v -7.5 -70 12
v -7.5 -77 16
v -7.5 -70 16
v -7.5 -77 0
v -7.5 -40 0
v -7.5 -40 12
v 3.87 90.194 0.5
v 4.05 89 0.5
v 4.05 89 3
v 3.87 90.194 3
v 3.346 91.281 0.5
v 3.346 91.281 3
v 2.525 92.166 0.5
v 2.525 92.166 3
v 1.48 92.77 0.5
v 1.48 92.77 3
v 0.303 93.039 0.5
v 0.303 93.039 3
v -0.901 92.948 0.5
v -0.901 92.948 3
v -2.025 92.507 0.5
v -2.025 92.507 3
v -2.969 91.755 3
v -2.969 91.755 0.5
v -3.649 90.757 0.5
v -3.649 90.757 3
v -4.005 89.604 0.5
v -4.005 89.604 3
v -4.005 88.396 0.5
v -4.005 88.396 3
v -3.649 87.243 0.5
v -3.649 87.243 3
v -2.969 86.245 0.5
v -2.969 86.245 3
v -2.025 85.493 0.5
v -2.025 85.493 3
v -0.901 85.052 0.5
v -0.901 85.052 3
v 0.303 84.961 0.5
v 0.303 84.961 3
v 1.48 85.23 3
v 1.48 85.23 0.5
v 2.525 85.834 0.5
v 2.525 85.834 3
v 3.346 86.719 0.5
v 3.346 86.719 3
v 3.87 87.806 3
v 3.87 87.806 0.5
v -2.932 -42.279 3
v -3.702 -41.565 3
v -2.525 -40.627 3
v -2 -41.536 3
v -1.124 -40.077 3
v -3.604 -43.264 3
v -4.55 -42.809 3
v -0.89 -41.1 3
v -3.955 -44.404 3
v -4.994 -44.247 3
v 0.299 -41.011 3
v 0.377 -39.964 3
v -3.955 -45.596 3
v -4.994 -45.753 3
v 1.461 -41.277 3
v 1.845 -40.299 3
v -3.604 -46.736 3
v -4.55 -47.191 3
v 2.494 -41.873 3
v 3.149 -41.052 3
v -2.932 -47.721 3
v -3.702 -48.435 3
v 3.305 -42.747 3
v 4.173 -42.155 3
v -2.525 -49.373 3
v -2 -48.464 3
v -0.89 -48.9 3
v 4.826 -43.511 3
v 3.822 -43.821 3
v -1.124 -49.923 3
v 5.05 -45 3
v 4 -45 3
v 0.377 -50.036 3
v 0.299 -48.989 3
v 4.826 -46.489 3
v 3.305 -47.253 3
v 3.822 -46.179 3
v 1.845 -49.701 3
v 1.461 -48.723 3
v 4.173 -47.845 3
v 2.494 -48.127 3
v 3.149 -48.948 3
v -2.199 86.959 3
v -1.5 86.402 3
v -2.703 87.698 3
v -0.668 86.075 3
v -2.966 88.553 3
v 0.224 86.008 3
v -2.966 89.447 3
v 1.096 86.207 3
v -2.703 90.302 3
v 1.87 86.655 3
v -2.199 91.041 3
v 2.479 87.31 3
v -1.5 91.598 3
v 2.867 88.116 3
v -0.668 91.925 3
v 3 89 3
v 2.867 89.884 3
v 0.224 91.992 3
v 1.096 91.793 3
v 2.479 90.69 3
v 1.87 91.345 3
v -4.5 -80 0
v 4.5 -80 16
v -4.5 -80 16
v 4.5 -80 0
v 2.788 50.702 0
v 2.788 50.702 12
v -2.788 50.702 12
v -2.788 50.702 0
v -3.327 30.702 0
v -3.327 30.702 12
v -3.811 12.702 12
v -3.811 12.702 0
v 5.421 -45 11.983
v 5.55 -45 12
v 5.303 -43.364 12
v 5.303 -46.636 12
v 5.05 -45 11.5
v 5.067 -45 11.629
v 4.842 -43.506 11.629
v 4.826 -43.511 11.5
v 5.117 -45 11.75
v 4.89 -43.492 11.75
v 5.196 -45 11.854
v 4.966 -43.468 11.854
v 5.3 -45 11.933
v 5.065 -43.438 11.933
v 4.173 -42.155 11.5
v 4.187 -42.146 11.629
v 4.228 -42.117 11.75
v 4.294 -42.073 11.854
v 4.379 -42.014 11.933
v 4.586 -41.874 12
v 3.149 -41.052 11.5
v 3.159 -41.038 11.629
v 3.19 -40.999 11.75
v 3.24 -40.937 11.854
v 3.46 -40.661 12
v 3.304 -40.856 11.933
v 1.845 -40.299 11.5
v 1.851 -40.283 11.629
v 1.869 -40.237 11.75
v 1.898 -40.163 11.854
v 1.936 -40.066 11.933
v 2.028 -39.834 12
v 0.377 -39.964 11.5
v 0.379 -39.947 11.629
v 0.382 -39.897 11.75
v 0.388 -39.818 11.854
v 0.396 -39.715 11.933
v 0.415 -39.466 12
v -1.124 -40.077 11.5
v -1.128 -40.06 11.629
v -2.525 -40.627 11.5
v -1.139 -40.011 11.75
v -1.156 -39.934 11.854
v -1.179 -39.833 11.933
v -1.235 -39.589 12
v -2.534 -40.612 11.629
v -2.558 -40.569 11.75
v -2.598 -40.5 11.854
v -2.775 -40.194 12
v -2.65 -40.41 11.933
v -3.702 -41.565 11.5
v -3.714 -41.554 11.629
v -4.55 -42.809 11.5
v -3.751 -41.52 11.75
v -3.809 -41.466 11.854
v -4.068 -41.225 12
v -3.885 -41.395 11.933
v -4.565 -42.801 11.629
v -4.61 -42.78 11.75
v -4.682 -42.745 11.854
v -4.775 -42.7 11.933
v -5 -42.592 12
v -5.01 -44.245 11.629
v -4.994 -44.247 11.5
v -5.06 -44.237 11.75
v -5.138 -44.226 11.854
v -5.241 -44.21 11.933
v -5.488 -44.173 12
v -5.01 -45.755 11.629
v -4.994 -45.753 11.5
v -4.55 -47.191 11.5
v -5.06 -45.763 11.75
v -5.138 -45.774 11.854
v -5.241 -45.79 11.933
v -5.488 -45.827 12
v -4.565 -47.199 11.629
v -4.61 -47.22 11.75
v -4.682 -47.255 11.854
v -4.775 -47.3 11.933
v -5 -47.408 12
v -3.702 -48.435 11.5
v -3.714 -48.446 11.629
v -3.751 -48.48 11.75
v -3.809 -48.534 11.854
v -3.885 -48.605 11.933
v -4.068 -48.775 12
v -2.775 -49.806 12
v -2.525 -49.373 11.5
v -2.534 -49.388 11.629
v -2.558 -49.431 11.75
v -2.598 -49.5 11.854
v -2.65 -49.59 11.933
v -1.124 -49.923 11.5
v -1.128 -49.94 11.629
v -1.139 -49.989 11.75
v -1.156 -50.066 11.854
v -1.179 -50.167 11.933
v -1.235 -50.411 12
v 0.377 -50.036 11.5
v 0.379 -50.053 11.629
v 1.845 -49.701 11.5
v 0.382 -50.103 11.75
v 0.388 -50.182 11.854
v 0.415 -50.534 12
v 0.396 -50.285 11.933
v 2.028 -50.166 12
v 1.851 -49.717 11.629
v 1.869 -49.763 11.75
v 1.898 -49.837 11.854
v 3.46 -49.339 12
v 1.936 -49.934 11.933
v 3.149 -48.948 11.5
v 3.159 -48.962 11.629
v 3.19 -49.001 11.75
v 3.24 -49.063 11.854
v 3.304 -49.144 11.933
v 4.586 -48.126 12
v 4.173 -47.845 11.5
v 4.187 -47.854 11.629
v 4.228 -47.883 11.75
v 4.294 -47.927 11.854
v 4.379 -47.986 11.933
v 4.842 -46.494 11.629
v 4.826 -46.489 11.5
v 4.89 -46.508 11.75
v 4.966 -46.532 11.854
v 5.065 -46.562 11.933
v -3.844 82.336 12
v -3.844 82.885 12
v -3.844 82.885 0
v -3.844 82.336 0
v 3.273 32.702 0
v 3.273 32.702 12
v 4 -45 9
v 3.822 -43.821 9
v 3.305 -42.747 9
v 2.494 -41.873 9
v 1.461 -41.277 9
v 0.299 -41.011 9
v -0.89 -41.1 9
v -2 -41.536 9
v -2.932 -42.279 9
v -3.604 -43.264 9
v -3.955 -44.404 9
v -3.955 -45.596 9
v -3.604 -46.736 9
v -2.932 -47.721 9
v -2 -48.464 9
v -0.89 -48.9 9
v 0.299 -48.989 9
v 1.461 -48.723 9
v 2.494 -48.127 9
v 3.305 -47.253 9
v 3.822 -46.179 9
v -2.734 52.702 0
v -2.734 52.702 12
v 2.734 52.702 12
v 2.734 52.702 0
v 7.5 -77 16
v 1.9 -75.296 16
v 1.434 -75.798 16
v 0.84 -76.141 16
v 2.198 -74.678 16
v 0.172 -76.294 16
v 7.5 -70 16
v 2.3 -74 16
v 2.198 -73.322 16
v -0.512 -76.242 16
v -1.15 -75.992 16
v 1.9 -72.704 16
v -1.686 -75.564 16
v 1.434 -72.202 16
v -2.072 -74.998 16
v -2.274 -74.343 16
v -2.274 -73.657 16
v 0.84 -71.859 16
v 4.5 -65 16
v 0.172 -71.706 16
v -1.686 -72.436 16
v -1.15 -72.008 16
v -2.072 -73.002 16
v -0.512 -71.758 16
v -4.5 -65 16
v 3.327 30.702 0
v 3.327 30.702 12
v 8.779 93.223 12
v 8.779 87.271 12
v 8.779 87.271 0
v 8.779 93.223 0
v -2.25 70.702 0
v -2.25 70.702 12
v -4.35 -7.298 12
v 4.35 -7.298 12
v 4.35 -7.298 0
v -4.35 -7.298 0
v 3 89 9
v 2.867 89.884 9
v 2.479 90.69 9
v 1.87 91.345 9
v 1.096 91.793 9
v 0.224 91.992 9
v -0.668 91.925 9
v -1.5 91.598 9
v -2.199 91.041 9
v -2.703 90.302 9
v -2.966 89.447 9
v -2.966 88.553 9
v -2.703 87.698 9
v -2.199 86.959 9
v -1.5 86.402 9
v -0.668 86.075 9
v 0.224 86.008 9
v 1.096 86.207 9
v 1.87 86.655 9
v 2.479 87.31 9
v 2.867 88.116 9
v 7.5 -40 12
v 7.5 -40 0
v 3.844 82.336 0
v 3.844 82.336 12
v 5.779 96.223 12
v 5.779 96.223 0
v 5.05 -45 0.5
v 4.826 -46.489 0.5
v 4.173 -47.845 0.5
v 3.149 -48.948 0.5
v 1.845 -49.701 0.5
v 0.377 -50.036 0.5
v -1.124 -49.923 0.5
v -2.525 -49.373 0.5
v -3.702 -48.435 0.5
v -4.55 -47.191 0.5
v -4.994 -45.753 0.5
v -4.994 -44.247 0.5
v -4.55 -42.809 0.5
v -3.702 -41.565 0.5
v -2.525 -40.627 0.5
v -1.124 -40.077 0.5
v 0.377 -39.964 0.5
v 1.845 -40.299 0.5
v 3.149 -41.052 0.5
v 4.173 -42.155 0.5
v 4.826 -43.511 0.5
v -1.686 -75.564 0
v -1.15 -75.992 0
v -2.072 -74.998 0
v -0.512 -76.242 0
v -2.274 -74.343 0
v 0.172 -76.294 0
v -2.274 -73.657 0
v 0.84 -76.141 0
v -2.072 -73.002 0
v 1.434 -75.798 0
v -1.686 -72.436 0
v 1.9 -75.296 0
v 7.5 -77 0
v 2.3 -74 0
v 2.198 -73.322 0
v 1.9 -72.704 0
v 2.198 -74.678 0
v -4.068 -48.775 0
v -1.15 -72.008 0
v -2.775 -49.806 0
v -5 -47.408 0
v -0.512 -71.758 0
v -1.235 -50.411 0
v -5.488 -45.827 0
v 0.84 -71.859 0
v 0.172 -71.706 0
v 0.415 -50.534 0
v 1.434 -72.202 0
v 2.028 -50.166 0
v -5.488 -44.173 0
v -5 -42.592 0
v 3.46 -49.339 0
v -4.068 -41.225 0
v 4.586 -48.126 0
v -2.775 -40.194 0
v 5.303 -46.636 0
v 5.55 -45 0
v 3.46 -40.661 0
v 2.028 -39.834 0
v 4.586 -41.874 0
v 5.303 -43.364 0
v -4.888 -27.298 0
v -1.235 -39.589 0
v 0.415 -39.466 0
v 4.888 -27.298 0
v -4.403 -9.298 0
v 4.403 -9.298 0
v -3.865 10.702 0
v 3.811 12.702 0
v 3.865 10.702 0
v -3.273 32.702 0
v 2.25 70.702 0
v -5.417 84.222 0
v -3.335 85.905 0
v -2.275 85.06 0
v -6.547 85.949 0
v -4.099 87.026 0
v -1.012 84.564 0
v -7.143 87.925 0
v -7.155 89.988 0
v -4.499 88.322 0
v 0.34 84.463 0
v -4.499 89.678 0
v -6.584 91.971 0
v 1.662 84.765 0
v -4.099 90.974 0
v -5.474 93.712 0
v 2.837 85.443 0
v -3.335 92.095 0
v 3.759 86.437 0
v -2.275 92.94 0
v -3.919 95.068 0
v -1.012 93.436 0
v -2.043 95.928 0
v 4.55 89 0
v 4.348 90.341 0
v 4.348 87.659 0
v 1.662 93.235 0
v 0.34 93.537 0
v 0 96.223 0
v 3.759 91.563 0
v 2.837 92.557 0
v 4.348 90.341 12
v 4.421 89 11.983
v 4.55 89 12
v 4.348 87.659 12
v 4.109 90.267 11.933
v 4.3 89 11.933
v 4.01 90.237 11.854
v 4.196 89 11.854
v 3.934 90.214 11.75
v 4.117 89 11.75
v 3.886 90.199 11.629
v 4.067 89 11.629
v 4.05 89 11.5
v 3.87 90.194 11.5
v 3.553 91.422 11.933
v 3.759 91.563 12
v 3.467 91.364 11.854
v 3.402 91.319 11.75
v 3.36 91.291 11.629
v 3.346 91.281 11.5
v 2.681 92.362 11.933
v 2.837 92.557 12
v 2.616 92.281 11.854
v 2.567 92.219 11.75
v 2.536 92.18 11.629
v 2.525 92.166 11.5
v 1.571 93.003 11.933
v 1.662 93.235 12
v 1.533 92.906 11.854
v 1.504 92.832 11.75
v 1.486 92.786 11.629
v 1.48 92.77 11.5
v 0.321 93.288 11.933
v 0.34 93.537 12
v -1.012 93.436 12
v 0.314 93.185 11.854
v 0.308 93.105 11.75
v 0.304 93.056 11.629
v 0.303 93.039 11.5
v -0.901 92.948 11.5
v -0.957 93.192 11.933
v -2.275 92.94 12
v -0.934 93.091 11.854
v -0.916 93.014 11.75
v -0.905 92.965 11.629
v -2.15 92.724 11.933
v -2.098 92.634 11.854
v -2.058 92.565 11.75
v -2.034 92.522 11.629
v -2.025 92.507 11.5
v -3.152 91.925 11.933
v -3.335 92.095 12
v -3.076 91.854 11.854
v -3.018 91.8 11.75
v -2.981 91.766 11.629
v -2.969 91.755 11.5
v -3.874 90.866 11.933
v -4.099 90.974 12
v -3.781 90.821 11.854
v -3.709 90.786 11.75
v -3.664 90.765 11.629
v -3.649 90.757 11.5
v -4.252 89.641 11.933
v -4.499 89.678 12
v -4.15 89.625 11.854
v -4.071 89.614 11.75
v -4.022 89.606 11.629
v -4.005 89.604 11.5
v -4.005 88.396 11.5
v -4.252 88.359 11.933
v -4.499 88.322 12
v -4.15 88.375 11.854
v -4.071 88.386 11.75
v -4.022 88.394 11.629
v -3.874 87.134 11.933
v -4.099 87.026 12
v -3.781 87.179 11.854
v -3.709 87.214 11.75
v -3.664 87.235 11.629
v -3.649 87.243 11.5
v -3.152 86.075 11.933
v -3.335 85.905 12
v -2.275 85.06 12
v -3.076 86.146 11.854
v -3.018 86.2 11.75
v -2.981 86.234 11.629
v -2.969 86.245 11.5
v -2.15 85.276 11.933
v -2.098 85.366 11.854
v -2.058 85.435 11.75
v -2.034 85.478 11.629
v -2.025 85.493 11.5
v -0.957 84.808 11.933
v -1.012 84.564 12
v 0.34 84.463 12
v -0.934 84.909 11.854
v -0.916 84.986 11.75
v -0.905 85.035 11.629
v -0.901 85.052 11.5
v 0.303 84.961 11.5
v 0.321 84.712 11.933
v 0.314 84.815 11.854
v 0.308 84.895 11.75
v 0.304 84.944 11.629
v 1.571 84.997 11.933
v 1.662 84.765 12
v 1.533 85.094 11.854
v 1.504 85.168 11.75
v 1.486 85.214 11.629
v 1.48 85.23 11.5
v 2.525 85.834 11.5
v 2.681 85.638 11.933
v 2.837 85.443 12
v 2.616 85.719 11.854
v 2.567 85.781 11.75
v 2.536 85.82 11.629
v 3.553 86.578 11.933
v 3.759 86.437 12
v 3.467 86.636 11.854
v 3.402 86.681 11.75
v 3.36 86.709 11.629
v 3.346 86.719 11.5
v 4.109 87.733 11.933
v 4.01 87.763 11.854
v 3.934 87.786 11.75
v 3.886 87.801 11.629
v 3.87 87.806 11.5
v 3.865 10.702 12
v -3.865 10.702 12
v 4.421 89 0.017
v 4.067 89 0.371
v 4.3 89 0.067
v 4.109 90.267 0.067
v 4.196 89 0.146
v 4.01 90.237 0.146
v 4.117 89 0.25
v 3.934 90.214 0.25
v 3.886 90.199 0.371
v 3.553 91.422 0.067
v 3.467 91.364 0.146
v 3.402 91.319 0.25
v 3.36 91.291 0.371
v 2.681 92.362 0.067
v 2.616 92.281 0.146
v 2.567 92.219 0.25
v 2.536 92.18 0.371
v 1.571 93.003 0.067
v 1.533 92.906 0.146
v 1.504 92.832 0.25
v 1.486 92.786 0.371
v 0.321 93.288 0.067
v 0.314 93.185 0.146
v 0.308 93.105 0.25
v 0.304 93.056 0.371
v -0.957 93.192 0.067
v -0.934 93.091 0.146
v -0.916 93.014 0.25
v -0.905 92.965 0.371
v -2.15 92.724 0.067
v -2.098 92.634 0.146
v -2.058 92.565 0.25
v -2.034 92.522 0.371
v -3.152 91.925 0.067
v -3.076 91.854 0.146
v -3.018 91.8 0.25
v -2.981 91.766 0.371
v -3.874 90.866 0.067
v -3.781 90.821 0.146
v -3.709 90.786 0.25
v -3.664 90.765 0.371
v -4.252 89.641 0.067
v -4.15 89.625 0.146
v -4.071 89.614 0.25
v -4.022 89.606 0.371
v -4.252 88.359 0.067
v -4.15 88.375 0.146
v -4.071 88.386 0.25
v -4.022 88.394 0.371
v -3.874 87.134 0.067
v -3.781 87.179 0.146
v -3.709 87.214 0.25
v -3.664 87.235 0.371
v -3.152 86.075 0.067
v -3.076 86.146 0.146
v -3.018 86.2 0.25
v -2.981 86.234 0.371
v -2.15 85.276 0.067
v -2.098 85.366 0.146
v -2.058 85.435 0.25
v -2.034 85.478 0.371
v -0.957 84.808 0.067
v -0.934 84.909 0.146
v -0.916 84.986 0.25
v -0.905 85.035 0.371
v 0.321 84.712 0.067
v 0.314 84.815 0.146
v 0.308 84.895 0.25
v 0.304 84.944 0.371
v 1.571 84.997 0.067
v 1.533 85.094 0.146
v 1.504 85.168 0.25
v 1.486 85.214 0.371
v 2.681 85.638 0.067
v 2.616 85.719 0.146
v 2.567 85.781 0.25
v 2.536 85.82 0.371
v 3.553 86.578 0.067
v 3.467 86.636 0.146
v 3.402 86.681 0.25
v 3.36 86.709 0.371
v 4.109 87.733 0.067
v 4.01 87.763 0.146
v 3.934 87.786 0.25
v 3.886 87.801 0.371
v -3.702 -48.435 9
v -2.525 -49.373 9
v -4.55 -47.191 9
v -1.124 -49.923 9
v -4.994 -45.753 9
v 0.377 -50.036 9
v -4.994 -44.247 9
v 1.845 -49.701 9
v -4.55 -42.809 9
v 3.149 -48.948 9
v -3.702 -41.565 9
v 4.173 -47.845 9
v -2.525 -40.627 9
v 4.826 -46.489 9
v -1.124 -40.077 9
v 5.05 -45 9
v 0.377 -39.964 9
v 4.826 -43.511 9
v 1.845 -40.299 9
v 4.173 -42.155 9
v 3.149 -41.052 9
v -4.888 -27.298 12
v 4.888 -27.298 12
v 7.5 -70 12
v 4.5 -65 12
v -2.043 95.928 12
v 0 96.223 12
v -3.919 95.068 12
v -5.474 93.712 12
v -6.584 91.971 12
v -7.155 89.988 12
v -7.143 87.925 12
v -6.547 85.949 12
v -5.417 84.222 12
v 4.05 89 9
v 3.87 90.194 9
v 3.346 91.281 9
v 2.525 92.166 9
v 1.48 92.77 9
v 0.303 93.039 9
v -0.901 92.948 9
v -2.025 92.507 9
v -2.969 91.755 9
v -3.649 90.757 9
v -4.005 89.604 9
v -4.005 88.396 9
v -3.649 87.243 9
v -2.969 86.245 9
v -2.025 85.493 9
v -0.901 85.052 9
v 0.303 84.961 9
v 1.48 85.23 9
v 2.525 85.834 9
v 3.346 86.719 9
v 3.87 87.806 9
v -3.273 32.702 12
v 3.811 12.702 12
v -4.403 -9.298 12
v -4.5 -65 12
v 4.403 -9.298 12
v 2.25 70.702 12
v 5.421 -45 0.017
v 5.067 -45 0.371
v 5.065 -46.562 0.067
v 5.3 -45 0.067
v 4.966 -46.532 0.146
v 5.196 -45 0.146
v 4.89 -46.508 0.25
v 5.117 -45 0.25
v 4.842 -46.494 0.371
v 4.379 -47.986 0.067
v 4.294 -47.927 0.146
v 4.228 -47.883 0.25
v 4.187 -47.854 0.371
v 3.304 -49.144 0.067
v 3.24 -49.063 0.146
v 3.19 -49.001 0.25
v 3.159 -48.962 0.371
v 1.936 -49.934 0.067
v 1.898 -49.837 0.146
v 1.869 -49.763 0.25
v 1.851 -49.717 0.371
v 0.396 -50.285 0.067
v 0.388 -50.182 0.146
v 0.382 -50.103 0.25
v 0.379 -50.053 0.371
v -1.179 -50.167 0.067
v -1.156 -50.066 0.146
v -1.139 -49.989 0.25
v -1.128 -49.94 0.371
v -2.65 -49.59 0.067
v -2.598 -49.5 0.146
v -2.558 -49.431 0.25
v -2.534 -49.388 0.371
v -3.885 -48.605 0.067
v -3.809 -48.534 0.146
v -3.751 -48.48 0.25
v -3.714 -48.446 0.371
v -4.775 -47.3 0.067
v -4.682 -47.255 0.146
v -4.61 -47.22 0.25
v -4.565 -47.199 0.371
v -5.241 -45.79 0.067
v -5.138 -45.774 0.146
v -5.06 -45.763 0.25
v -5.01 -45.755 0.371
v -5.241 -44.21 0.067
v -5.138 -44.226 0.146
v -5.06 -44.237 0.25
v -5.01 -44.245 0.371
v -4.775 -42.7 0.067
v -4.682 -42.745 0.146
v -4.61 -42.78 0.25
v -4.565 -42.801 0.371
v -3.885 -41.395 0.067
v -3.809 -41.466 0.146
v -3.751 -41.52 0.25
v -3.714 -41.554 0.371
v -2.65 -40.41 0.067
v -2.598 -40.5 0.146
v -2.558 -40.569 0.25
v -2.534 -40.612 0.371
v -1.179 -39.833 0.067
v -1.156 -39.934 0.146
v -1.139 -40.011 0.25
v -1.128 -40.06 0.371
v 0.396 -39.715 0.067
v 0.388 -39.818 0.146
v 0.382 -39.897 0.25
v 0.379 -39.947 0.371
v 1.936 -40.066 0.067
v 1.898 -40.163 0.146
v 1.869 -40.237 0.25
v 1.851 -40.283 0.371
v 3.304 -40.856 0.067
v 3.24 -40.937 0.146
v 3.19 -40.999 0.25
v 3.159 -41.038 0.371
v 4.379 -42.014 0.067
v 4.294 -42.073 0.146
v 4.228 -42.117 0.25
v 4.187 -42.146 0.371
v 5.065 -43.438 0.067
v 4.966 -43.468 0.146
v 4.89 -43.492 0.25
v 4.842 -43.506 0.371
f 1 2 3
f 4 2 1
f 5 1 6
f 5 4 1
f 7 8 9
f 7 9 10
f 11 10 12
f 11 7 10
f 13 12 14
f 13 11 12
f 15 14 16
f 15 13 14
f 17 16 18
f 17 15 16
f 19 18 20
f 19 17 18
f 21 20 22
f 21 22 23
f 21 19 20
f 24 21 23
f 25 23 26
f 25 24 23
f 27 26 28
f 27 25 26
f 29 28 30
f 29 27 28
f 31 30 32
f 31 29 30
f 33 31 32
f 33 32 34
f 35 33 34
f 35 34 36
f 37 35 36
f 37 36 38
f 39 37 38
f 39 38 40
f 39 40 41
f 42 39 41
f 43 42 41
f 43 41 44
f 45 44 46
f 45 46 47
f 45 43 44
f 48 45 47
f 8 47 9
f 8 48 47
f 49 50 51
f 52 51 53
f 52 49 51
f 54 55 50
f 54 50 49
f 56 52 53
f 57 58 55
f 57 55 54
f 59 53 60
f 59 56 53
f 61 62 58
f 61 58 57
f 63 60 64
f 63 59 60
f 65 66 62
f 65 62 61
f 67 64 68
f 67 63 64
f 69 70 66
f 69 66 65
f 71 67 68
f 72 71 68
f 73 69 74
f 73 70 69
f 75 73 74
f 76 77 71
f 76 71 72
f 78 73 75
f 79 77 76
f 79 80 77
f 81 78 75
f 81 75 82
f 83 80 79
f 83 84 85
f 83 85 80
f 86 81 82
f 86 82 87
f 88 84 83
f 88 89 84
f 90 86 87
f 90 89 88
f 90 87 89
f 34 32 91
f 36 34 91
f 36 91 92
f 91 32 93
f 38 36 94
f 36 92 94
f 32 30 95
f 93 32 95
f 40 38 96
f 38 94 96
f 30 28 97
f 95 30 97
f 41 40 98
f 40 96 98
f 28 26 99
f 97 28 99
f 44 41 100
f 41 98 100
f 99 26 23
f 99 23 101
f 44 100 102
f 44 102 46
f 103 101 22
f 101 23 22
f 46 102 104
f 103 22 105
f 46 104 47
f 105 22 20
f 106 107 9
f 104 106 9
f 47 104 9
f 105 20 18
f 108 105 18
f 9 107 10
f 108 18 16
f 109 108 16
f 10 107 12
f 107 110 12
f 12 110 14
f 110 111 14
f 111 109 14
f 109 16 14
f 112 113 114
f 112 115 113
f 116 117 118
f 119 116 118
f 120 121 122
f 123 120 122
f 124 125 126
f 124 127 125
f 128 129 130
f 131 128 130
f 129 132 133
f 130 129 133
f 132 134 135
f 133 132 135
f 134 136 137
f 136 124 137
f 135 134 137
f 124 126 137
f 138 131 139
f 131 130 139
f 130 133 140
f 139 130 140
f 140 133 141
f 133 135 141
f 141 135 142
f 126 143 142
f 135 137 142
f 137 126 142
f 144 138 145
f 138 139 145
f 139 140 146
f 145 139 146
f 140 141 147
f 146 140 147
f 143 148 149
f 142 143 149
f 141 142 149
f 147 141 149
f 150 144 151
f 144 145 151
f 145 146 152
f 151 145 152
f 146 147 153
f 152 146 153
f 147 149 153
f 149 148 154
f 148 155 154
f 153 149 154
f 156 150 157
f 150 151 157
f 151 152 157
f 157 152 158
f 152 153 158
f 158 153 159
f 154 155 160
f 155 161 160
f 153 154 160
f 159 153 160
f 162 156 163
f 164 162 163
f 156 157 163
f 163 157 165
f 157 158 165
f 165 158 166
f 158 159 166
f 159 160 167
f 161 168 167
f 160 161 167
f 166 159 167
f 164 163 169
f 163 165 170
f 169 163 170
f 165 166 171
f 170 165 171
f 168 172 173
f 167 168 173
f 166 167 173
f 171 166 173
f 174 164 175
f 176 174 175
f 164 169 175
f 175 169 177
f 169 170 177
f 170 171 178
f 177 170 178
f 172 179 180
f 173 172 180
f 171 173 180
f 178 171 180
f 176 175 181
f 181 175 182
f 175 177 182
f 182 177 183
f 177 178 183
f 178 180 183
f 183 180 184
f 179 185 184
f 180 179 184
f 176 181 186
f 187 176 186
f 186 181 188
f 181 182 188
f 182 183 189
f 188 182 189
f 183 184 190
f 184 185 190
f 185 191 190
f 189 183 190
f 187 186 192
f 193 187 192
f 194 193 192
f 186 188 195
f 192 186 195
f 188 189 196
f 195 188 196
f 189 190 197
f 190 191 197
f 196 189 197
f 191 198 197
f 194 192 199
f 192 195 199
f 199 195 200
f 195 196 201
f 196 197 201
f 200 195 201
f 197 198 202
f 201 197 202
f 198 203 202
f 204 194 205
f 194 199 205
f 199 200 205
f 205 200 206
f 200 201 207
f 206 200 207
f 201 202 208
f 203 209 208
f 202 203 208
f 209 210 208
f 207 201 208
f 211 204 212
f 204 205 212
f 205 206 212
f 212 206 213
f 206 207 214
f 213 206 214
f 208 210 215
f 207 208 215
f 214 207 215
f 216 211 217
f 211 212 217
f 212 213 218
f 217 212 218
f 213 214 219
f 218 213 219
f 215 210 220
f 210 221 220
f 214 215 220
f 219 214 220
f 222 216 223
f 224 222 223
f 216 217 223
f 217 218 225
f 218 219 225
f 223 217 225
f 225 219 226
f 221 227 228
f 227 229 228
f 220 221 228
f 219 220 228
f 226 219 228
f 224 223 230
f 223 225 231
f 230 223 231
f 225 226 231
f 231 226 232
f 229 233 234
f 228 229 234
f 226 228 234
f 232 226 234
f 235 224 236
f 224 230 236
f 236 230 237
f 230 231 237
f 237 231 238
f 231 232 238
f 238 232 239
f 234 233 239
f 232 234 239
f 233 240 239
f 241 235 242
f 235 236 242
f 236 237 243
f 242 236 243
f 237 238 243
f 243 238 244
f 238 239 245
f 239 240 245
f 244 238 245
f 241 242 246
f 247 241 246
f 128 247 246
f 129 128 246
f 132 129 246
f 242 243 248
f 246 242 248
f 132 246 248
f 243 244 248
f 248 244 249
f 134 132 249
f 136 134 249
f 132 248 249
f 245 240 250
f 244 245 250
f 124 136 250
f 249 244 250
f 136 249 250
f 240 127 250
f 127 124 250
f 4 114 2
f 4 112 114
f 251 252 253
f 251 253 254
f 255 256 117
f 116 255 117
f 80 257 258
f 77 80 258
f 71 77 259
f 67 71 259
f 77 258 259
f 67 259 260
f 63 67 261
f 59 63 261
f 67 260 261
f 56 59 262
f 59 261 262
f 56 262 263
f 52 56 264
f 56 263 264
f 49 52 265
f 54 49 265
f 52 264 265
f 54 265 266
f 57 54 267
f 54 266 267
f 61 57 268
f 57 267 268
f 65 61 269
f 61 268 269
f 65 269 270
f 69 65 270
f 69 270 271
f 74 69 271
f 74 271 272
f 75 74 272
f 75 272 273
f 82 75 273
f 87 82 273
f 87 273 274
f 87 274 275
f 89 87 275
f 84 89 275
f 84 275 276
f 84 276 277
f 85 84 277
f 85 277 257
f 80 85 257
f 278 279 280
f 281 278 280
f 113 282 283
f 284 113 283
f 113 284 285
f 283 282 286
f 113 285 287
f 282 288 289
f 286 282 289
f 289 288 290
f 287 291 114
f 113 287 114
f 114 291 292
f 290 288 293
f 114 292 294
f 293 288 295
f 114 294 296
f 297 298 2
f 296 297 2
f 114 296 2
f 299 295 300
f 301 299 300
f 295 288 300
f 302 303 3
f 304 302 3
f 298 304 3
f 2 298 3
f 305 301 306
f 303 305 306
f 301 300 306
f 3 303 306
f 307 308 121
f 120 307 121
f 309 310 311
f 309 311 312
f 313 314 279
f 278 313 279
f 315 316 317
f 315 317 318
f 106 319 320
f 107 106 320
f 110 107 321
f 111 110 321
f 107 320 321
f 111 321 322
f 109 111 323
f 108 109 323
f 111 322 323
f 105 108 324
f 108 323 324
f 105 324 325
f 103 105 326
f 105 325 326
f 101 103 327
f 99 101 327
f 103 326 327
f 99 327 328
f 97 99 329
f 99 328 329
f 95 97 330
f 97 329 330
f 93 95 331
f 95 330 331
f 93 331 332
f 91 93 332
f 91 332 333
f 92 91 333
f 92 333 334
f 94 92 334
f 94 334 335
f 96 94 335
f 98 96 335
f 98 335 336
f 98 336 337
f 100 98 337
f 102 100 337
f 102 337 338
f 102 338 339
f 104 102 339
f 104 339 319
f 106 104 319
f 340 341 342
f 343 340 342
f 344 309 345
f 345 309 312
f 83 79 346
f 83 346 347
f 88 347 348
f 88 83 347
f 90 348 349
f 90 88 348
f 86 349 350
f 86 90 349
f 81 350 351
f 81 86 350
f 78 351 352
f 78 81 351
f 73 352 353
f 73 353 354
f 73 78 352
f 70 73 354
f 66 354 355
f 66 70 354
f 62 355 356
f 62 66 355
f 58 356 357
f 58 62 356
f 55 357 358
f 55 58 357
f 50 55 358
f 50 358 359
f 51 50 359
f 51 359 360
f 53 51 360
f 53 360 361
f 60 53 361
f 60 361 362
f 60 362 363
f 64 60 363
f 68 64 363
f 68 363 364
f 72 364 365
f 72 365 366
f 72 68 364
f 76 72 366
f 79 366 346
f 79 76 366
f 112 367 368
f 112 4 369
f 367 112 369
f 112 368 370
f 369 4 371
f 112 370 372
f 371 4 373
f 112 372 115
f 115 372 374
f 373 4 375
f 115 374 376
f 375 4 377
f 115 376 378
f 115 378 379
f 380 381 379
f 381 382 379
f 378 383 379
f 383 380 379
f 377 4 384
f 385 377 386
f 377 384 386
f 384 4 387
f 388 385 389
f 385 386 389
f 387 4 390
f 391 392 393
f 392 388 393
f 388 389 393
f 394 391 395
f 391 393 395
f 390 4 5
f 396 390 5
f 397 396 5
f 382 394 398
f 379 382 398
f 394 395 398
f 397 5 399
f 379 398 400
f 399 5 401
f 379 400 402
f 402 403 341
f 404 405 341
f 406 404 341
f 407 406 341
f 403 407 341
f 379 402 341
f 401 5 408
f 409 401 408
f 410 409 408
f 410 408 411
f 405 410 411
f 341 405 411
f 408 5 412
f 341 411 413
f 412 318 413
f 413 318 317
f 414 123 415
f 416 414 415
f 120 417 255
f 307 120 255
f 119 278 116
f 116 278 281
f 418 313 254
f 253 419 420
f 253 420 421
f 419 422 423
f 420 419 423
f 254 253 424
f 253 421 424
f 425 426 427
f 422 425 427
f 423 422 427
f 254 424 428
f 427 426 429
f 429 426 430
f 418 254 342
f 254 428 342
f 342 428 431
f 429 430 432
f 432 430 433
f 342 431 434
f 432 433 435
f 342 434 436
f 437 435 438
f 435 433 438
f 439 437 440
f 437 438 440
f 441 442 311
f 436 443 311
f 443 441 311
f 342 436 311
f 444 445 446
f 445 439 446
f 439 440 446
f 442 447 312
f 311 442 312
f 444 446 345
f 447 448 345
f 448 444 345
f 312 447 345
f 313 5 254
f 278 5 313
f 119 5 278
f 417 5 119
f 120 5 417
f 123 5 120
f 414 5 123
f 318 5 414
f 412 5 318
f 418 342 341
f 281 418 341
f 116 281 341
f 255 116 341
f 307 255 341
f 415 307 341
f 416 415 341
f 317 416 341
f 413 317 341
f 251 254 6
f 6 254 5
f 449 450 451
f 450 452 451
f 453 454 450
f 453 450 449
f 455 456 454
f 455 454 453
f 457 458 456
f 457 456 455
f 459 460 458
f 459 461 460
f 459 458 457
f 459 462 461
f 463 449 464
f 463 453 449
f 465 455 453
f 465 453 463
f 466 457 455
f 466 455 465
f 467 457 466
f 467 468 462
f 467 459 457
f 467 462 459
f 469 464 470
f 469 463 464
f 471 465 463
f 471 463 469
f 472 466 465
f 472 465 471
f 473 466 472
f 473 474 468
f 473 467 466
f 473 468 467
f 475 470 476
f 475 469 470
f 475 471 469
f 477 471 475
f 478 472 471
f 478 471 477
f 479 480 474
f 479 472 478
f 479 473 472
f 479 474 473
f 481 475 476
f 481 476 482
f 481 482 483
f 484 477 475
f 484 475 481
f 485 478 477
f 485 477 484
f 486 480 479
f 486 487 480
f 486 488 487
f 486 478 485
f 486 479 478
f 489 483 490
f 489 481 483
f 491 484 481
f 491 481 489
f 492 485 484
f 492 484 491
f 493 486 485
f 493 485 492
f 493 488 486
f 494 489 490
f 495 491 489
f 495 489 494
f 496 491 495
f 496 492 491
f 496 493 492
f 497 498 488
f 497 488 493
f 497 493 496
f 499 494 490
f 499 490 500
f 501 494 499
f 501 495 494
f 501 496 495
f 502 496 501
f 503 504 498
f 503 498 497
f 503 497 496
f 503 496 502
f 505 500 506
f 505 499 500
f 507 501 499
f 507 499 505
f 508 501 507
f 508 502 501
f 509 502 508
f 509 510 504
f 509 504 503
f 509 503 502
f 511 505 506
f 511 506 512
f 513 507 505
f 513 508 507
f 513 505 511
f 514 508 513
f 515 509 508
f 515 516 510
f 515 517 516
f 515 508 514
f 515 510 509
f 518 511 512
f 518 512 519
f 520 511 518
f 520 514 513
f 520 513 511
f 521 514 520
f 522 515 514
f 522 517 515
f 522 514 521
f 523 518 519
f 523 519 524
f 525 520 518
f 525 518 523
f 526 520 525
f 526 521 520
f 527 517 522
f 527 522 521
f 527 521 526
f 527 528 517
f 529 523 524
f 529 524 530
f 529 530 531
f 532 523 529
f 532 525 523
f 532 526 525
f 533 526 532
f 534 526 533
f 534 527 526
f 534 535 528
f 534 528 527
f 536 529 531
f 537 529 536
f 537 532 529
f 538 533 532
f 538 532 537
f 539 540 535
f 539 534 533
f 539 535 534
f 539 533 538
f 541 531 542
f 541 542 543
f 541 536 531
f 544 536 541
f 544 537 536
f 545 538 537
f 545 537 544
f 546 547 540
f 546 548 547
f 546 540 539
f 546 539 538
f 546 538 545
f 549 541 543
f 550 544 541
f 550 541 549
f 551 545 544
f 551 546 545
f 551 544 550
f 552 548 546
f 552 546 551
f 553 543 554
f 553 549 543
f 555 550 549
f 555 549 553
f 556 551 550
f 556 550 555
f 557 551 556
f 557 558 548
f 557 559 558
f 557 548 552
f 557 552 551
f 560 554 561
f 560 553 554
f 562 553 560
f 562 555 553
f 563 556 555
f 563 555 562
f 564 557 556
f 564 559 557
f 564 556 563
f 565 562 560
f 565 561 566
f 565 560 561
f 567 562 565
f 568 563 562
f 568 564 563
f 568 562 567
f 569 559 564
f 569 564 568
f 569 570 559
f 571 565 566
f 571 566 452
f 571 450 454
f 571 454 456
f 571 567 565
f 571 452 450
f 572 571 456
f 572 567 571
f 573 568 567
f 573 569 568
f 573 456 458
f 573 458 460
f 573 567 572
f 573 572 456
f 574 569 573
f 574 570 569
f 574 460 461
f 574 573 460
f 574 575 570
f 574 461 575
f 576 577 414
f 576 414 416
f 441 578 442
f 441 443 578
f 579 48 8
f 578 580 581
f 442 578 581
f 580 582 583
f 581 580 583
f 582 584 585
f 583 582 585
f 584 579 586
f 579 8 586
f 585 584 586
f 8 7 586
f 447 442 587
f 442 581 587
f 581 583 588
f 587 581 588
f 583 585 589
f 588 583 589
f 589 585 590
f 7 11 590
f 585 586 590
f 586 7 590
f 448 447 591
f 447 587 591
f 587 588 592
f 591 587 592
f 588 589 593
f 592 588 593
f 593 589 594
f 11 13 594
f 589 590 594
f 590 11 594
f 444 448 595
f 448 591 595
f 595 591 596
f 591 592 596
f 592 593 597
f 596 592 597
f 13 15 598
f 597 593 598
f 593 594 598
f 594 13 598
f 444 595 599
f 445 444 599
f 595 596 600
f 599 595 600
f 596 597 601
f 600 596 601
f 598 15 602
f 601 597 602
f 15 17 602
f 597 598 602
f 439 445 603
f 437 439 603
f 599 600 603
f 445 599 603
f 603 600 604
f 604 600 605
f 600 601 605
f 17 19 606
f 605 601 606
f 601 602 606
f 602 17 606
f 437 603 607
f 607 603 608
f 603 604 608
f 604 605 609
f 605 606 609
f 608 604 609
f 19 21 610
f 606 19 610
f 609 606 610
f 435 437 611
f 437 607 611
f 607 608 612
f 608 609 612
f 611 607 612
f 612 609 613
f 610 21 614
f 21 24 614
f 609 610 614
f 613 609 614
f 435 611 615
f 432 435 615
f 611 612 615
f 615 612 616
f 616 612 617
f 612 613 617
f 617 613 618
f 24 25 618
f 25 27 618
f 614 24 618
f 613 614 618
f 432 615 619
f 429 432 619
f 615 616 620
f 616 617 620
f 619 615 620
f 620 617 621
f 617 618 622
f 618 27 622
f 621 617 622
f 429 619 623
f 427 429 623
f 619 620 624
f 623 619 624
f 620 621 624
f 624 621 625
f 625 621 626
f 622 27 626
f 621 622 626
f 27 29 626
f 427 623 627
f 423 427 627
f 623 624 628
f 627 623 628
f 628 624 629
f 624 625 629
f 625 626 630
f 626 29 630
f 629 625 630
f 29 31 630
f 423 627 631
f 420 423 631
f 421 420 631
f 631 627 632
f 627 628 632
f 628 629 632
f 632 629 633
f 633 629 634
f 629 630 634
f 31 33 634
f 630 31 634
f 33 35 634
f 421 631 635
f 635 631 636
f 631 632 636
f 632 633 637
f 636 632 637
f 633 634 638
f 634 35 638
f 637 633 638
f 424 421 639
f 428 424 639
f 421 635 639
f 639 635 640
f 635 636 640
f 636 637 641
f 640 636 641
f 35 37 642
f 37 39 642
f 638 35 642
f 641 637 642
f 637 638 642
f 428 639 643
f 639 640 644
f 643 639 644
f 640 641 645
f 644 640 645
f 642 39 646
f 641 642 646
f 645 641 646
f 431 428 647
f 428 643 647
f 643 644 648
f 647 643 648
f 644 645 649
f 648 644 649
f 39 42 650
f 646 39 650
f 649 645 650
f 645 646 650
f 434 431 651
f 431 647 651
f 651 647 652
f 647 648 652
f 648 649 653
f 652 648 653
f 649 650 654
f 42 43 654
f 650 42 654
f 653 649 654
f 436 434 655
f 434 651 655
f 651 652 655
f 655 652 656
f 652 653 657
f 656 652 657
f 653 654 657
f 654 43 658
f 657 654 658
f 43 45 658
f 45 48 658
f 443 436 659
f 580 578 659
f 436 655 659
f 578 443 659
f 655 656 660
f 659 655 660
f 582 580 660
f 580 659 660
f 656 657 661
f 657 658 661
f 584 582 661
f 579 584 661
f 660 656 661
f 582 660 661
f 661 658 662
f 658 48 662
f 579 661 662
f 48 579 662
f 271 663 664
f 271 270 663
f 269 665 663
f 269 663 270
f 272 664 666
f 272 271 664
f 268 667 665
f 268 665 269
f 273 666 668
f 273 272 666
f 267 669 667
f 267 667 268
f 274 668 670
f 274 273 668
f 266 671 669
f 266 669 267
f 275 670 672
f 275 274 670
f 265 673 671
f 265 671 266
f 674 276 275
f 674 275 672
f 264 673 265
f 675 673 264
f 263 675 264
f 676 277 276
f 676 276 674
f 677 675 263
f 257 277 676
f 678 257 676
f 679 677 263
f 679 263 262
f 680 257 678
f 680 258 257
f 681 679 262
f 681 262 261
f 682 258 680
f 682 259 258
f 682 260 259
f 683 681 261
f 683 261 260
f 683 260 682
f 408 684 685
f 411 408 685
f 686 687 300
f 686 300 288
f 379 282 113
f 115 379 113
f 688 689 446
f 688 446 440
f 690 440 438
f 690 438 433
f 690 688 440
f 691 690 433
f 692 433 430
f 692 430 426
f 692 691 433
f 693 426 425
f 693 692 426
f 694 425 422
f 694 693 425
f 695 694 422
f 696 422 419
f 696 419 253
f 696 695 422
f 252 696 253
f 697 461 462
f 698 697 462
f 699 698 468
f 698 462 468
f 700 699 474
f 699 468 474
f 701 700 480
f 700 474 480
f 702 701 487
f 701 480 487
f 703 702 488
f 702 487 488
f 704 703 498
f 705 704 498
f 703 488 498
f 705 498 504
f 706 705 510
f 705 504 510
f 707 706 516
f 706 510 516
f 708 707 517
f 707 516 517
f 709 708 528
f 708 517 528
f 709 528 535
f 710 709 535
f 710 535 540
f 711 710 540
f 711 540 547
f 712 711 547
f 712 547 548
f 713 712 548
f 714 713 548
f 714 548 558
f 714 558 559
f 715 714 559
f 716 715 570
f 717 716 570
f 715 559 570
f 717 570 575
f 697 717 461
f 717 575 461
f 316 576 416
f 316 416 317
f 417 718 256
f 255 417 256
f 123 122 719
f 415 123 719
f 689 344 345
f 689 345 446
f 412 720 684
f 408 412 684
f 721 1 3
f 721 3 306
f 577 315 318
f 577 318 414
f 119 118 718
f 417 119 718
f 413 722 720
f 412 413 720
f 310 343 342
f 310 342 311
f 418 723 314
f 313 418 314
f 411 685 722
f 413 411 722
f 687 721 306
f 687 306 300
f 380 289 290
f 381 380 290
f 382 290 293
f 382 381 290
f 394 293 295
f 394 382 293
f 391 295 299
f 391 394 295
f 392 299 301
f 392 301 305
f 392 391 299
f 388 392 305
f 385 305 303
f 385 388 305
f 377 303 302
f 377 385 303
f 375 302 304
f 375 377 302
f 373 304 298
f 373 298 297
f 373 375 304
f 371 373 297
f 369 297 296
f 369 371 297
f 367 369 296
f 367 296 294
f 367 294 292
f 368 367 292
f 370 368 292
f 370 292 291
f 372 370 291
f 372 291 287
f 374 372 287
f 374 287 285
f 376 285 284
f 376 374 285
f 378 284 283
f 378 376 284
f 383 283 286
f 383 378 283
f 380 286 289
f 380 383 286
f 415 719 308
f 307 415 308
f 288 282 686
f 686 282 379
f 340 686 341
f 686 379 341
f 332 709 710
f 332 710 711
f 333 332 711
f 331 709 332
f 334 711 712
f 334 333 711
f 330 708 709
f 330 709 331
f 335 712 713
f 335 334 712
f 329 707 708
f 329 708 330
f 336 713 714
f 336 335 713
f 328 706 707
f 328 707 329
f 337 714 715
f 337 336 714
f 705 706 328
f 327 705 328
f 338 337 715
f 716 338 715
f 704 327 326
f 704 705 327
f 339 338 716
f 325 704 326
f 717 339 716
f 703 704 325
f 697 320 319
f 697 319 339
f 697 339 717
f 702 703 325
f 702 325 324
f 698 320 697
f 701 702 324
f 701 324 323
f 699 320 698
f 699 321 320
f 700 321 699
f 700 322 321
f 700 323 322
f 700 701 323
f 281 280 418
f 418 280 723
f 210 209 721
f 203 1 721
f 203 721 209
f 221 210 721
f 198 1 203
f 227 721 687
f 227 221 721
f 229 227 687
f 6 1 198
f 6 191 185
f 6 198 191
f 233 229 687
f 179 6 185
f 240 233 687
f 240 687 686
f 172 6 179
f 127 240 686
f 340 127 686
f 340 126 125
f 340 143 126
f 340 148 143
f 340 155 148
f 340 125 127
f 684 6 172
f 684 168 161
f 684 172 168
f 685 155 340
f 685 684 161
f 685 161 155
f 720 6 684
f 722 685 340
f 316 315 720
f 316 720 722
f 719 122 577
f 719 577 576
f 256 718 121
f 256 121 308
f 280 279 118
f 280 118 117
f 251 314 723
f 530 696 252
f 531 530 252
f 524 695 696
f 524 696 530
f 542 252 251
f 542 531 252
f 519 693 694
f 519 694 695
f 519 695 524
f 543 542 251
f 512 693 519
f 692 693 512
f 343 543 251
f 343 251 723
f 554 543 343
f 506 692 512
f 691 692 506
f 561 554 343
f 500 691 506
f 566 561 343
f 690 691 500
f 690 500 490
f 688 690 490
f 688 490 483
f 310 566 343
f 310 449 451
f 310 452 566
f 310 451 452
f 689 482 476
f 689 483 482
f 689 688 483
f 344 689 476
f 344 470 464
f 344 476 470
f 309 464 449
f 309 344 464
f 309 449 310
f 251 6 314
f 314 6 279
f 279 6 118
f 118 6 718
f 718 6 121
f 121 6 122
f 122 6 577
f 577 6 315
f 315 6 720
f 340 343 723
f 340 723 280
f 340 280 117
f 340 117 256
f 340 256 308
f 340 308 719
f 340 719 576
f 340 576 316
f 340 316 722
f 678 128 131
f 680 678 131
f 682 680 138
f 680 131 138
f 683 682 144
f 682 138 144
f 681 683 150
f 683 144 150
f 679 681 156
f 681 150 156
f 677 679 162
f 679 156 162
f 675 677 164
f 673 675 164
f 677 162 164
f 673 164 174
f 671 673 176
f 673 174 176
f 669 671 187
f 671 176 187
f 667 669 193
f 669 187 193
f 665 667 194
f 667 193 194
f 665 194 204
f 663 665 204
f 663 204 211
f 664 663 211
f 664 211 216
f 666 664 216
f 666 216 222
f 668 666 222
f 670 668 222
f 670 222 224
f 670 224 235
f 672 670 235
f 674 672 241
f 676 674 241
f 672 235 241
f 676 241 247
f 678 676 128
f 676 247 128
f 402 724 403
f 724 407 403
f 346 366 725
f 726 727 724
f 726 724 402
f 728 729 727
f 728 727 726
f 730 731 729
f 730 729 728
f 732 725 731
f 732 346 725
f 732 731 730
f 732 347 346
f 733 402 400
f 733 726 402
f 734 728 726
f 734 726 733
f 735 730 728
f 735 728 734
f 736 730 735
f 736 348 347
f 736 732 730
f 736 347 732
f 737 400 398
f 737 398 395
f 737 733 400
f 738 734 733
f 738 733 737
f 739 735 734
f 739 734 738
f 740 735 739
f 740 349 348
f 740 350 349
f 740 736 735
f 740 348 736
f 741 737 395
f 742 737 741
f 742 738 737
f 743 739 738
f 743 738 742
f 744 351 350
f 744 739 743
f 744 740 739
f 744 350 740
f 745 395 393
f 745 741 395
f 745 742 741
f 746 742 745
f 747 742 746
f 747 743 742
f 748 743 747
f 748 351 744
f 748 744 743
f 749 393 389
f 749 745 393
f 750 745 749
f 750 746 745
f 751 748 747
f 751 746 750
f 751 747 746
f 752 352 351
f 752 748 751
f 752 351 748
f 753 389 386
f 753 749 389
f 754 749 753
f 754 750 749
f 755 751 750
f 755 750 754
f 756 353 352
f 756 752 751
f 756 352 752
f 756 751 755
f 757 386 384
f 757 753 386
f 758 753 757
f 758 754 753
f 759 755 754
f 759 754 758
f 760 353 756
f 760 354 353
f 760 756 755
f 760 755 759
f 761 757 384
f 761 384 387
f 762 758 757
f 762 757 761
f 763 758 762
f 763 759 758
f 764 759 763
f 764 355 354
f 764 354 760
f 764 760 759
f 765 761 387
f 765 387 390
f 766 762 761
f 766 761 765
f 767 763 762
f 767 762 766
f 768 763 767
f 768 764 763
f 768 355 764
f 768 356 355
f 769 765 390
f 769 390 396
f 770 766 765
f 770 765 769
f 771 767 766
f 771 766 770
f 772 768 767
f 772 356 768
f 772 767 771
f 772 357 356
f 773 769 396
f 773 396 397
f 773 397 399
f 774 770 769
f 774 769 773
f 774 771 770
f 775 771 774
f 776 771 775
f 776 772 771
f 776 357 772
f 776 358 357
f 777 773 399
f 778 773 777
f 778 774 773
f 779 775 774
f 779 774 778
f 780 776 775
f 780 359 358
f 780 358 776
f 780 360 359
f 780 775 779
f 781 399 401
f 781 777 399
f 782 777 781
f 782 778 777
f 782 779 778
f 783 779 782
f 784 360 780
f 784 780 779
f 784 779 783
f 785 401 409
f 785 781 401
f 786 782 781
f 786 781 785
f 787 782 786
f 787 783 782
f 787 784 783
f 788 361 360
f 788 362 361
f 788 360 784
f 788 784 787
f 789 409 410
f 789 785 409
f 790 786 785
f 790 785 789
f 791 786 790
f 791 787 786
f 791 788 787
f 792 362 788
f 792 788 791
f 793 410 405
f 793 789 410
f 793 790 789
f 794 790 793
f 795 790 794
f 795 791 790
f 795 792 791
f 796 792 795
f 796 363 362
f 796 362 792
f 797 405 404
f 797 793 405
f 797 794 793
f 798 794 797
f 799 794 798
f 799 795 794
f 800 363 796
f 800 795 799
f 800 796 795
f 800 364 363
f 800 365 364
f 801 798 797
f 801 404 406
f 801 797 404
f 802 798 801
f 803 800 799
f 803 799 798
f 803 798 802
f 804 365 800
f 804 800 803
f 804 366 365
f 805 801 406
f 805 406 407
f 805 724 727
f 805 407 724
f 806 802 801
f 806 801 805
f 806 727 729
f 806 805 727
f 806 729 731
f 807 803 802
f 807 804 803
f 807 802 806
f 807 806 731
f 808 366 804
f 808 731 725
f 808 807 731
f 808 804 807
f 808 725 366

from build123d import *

# Parameters (mm, degrees)
SKETCH_1_R          = 2.3
EXTRUDE_1_DEPTH     = 12
SKETCH_2_R          = 5.05
CUT_EXTRUDE_1_DEPTH = 3
CUT_EXTRUDE_START   = -3
SKETCH_3_R          = 5.05
CUT_EXTRUDE_2_DEPTH = 3
SKETCH_4_R          = 4
CUT_EXTRUDE_3_DEPTH = 15
CUT_EXTRUDE_4_DEPTH = 15
CHAMFER_1_SIZE      = 3
EXTRUDE_2_DEPTH     = 12
SKETCH_8_R          = 3
CUT_EXTRUDE_5_DEPTH = 12
CHAMFER_2_SIZE      = 3
SKETCH_9_R          = 2.3
EXTRUDE_4_DEPTH     = 4
FILLET_1_R          = 0.5
CUT_EXTRUDE_6_DEPTH = 22
SKETCH_11_R         = 4.05
CUT_EXTRUDE_7_DEPTH = 3
FILLET_2_R          = 0.5


with BuildPart() as part:
    # 草图1 → 凸台-拉伸1 (new body)
    with BuildSketch(Plane.XY):
        Polygon((-3.615367776, 90), (-7.5, -40), (-7.5, -80), (7.5, -80), (7.5, -40), (3.615367776, 90), align=None)
        with Locations((0, -74)):
            Circle(SKETCH_1_R, mode=Mode.SUBTRACT)
    extrude(amount=EXTRUDE_1_DEPTH)

    # 草图2 → 切除-拉伸1 (cut)
    with BuildSketch(Plane.XY.offset(12)):
        with Locations((0, -45)):
            Circle(SKETCH_2_R)
    extrude(amount=-CUT_EXTRUDE_1_DEPTH, mode=Mode.SUBTRACT)

    # 草图3 → 切除-拉伸2 (cut)
    with BuildSketch(Plane(origin=(0, 0, 0), x_dir=(-1, 0, 0), z_dir=(0, 0, -1)).offset(CUT_EXTRUDE_START)):
        with Locations(Location((0, -45, 0), (0, 0, 180))):
            Circle(SKETCH_3_R)
    extrude(amount=CUT_EXTRUDE_2_DEPTH, mode=Mode.SUBTRACT)

    # 草图4 → 切除-拉伸3 (cut)
    with BuildSketch(Plane.XY.offset(9)):
        with Locations((0, -45)):
            Circle(SKETCH_4_R)
    extrude(amount=-CUT_EXTRUDE_3_DEPTH, mode=Mode.SUBTRACT)

    # 草图6 → 切除-拉伸4 (cut)
    with BuildSketch(Plane.XY.offset(12)):
        Polygon((4.888073513, -27.298220102), (4.403458128, -9.298220102), (-4.403458128, -9.298220102), (-4.888073513, -27.298220102), align=None)
        Polygon((-3.86499659, 10.701779898), (3.86499659, 10.701779898), (4.349611974, -7.298220102), (-4.349611974, -7.298220102), align=None)
        Polygon((-2.734227359, 52.701779898), (2.734227359, 52.701779898), (2.249611974, 70.701779898), (-2.249611974, 70.701779898), align=None)
        Polygon((-3.272688897, 32.701779898), (3.272688897, 32.701779898), (2.788073513, 50.701779898), (-2.788073513, 50.701779898), align=None)
        Polygon((-3.811150436, 12.701779898), (3.811150436, 12.701779898), (3.326535051, 30.701779898), (-3.326535051, 30.701779898), align=None)
    extrude(amount=-CUT_EXTRUDE_4_DEPTH, mode=Mode.SUBTRACT)

    # 倒角1
    chamfer_1_edges = [part.edges().sort_by_distance(p)[0] for p in [
        (7.5, -80, 6),
        (-7.5, -80, 6),
    ]]
    chamfer(chamfer_1_edges, length=CHAMFER_1_SIZE)

    # 草图7 → 凸台-拉伸2 (add)
    with BuildSketch(Plane.XY.offset(12)):
        Polygon((-3.844369998, 82.33639451), (3.844369998, 82.33639451), (8.779475305, 87.271499817), (8.779475305, 96.223058652), (-8.779475305, 96.223058652), (-8.779475305, 87.271499817), align=None)
    extrude(amount=-EXTRUDE_2_DEPTH)

    # 草图8 → 切除-拉伸5 (cut)
    with BuildSketch(Plane.XY.offset(12)):
        with Locations((0, 89)):
            Circle(SKETCH_8_R)
    extrude(amount=-CUT_EXTRUDE_5_DEPTH, mode=Mode.SUBTRACT)

    # 倒角2
    chamfer_2_edges = [part.edges().sort_by_distance(p)[0] for p in [
        (-8.779475305, 96.223058652, 6),
        (8.779475305, 96.223058652, 6),
    ]]
    chamfer(chamfer_2_edges, length=CHAMFER_2_SIZE)

    # 草图9 → 凸台-拉伸4 (add)
    with BuildSketch(Plane.XY.offset(12)):
        Polygon((-7.5, -70), (-4.5, -65), (4.5, -65), (7.5, -70), (7.5, -77), (4.5, -80), (-4.5, -80), (-7.5, -77), align=None)
        with Locations((0, -74)):
            Circle(SKETCH_9_R, mode=Mode.SUBTRACT)
    extrude(amount=EXTRUDE_4_DEPTH)

    # 圆角1
    fillet_1_edges = [part.edges().sort_by_distance(p)[0] for p in [
        (-5.05, -45, 12),
        (-5.05, -45, 0),
    ]]
    fillet(fillet_1_edges, radius=FILLET_1_R)

    # 草图10 → 切除-拉伸6 (cut)
    with BuildSketch(Plane.XY.offset(12)):
        with BuildLine():
            Line((-5.779475305, 96.223058652), (0, 96.223058652))
            ThreePointArc((0, 96.223058652), (-6.94052162, 91.000433937), (-3.844369998, 82.884986049))
            Line((-3.844369998, 82.884986049), (-3.844369998, 82.33639451))
            Line((-3.844369998, 82.33639451), (-8.779475305, 87.271499817))
            Line((-8.779475305, 87.271499817), (-8.779475305, 93.223058652))
            Line((-8.779475305, 93.223058652), (-5.779475305, 96.223058652))
        make_face()
    extrude(amount=-CUT_EXTRUDE_6_DEPTH, mode=Mode.SUBTRACT)

    # 草图11 → 切除-拉伸7 (cut)
    with BuildSketch(Plane.XY.offset(12)):
        with Locations((0, 89)):
            Circle(SKETCH_11_R)
    cut_extrude_7 = extrude(amount=-CUT_EXTRUDE_7_DEPTH, mode=Mode.SUBTRACT)

    # 镜向1: 切除-拉伸7 across plane
    add(cut_extrude_7.mirror(Plane.XY.offset(6)), mode=Mode.SUBTRACT)

    # 圆角2
    fillet_2_edges = [part.edges().sort_by_distance(p)[0] for p in [
        (-4.05, 89, 12),
        (-4.05, 89, 0),
    ]]
    fillet(fillet_2_edges, radius=FILLET_2_R)


solid = part.part
